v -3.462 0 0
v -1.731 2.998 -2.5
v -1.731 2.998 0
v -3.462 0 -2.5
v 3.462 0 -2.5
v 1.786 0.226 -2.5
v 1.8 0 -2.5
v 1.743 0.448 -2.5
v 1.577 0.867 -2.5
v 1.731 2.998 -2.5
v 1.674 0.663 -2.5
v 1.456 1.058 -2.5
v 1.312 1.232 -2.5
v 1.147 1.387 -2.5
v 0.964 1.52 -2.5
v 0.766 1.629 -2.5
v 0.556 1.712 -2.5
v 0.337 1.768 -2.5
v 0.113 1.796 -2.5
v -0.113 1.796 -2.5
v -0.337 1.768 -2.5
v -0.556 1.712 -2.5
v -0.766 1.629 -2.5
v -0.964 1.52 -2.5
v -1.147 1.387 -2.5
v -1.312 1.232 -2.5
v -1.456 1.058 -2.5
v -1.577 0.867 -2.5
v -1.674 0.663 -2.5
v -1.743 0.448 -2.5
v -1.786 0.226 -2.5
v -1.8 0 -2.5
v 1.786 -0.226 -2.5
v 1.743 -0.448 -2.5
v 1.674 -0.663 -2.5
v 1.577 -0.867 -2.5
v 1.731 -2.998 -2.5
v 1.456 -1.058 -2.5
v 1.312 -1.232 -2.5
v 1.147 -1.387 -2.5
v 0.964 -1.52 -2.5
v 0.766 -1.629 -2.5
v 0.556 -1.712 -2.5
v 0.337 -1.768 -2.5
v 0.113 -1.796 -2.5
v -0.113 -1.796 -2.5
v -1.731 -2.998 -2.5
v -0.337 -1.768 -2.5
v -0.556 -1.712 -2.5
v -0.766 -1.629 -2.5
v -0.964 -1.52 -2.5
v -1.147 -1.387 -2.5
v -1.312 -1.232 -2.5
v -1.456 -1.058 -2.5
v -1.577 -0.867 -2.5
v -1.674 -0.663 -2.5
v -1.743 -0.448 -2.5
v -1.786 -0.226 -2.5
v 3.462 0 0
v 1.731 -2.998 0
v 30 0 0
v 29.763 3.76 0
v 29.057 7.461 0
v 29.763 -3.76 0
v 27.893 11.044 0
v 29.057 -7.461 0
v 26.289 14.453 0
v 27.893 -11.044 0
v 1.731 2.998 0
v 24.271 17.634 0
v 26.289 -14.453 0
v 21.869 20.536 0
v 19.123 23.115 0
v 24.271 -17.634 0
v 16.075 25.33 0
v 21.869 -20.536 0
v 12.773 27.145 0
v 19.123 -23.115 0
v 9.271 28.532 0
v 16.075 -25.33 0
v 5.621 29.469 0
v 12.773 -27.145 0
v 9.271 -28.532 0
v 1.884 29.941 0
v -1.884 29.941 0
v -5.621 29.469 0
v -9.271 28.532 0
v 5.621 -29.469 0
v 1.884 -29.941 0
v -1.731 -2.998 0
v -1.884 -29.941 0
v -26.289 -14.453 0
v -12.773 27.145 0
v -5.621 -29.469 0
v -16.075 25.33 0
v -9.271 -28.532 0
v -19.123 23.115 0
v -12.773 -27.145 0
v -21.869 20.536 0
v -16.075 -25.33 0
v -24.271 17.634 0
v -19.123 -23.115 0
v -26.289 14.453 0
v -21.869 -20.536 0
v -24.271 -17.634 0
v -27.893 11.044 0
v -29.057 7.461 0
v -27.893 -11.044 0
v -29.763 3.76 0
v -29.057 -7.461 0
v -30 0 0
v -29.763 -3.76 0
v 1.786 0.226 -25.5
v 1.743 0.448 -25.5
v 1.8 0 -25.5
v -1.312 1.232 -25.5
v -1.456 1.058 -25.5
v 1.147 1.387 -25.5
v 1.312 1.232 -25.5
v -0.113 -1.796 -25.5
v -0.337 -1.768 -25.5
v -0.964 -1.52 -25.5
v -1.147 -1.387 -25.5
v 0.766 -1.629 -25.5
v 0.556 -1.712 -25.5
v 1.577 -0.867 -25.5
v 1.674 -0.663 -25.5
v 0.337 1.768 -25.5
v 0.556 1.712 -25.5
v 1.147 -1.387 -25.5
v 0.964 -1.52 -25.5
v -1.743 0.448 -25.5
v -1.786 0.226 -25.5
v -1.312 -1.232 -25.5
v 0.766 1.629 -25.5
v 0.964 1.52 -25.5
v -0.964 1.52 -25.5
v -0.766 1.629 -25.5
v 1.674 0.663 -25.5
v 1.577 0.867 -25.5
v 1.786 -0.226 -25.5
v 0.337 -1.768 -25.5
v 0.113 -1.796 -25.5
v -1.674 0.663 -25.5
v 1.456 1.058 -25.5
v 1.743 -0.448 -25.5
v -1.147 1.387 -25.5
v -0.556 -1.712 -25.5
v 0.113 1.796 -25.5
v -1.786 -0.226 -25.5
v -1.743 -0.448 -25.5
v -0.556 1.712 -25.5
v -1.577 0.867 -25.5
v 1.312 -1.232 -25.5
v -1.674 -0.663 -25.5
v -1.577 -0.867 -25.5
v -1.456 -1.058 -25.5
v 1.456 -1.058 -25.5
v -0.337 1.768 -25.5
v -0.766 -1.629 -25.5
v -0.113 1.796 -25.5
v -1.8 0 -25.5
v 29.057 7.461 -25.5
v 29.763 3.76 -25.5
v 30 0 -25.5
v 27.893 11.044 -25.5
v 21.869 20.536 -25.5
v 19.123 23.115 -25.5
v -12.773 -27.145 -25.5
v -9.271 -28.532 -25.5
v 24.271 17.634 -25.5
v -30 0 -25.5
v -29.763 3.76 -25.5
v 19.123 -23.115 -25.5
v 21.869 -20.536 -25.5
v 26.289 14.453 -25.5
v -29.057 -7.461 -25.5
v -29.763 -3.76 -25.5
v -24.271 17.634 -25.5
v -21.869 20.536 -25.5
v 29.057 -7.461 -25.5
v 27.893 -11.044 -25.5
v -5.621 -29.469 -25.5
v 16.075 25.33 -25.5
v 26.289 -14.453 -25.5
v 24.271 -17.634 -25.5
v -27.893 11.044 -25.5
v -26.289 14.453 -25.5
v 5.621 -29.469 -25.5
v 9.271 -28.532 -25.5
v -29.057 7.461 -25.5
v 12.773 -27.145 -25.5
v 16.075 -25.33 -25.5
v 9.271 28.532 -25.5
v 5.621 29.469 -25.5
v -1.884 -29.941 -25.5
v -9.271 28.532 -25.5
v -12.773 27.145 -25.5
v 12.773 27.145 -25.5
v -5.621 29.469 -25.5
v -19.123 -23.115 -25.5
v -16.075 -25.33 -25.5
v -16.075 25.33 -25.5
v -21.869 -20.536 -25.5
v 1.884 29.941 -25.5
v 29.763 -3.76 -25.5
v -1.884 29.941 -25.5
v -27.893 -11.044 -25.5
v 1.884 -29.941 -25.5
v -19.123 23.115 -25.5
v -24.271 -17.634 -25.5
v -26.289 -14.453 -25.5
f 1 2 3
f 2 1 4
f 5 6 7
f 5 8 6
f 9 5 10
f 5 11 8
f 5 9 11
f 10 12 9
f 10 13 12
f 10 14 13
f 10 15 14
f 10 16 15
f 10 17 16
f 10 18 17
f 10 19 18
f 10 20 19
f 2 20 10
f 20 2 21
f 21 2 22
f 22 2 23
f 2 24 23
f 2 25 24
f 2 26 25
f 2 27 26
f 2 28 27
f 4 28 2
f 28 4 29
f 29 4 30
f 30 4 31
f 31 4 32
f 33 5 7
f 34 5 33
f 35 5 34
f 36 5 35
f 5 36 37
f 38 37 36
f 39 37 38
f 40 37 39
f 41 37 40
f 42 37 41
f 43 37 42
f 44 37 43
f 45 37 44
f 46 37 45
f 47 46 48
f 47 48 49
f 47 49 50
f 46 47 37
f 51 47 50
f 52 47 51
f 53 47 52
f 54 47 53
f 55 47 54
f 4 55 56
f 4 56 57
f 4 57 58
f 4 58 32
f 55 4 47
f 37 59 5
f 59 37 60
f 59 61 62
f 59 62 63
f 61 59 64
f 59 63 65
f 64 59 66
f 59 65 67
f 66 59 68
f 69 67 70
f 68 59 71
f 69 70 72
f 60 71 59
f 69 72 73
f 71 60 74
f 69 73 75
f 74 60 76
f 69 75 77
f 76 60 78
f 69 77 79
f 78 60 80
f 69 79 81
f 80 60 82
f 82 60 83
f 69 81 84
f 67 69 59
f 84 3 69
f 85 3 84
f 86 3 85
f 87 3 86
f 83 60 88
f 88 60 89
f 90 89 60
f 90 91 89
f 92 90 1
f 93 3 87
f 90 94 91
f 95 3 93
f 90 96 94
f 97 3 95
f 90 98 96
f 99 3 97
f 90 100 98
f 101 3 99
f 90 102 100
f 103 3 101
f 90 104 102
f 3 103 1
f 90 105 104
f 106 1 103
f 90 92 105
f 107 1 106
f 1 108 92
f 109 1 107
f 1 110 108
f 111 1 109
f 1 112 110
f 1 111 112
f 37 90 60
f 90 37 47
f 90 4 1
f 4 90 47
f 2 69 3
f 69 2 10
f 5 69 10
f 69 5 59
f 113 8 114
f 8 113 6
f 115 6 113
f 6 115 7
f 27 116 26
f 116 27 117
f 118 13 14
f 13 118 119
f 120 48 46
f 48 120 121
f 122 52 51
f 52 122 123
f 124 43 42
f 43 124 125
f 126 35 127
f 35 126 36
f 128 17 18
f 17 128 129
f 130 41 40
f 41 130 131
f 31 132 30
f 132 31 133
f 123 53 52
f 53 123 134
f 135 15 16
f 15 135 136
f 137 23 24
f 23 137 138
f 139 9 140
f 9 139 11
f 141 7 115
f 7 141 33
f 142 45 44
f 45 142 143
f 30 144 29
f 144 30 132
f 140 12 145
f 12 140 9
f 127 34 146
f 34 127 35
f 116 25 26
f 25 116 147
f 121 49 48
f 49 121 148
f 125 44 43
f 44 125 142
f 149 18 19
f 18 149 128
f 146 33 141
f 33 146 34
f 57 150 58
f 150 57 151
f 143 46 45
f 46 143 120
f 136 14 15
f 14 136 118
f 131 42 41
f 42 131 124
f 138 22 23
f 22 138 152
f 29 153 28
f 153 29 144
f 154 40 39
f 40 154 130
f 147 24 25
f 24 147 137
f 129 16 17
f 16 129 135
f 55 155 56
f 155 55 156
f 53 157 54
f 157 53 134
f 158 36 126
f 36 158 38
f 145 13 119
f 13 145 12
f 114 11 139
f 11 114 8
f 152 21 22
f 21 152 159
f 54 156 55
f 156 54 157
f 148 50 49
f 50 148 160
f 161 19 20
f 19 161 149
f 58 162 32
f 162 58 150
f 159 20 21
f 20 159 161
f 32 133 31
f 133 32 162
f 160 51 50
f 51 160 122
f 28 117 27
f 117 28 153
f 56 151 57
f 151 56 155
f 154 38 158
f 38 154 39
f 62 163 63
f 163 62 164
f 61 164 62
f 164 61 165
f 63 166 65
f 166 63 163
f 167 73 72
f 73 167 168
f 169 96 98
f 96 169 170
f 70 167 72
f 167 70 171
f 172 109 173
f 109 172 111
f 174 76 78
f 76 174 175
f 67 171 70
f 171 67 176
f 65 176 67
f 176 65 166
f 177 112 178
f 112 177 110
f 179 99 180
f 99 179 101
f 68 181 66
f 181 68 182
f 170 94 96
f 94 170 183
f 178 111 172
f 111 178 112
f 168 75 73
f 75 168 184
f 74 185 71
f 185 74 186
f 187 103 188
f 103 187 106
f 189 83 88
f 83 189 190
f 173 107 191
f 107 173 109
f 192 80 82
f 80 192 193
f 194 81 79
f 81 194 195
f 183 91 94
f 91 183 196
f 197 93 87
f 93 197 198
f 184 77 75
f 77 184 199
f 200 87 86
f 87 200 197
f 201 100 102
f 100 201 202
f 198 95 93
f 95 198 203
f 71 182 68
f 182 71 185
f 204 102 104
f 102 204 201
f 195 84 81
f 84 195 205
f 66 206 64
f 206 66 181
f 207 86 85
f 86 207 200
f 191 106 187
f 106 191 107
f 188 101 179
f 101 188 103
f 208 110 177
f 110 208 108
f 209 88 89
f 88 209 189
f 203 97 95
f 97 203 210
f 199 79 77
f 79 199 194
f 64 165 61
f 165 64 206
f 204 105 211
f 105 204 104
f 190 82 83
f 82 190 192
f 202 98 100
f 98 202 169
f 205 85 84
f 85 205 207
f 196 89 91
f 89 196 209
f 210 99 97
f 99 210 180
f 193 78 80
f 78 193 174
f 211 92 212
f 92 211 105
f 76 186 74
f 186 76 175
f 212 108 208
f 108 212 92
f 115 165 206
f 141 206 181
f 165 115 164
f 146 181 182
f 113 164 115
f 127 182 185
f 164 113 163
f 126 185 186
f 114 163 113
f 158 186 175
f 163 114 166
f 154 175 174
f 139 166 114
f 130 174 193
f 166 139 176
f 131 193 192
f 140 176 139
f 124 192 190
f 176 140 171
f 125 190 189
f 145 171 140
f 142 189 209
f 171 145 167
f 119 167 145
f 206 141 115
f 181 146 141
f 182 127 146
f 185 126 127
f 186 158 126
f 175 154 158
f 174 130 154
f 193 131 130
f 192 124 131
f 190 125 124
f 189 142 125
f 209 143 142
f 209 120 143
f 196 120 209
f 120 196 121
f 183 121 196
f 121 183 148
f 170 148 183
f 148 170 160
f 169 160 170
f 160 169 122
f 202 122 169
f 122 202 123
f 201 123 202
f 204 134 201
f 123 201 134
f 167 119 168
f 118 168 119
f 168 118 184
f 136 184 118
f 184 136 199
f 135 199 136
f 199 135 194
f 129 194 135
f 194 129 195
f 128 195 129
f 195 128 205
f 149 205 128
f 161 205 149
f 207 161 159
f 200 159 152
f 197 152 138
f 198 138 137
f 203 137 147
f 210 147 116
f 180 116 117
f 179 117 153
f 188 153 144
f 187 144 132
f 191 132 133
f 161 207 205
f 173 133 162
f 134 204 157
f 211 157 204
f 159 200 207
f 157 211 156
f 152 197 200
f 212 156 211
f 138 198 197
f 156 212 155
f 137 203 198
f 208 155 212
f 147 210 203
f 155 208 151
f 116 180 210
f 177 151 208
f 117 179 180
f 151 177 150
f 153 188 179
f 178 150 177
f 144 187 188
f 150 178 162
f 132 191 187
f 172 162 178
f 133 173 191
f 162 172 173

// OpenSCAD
$fn = 50;


difference() {
	union() {
		translate(v = [0, 0, -25.5000000000]) {
			cylinder(h = 25.5000000000, r = 30.0000000000);
		}
	}
	union() {
		translate(v = [0, 0, 0]) {
			rotate(a = [0, 0, 0]) {
				difference() {
					union() {
						translate(v = [0, 0, -2.5000000000]) {
							linear_extrude(height = 2.5000000000) {
								polygon(points = [[3.4620000000, 0.0000000000], [1.7310000000, 2.9981799479], [-1.7310000000, 2.9981799479], [-3.4620000000, 0.0000000000], [-1.7310000000, -2.9981799479], [1.7310000000, -2.9981799479]]);
							}
						}
					}
					union();
				}
			}
		}
		#translate(v = [0, 0, -100.0000000000]) {
			cylinder(h = 200, r = 1.8000000000);
		}
	}
}
